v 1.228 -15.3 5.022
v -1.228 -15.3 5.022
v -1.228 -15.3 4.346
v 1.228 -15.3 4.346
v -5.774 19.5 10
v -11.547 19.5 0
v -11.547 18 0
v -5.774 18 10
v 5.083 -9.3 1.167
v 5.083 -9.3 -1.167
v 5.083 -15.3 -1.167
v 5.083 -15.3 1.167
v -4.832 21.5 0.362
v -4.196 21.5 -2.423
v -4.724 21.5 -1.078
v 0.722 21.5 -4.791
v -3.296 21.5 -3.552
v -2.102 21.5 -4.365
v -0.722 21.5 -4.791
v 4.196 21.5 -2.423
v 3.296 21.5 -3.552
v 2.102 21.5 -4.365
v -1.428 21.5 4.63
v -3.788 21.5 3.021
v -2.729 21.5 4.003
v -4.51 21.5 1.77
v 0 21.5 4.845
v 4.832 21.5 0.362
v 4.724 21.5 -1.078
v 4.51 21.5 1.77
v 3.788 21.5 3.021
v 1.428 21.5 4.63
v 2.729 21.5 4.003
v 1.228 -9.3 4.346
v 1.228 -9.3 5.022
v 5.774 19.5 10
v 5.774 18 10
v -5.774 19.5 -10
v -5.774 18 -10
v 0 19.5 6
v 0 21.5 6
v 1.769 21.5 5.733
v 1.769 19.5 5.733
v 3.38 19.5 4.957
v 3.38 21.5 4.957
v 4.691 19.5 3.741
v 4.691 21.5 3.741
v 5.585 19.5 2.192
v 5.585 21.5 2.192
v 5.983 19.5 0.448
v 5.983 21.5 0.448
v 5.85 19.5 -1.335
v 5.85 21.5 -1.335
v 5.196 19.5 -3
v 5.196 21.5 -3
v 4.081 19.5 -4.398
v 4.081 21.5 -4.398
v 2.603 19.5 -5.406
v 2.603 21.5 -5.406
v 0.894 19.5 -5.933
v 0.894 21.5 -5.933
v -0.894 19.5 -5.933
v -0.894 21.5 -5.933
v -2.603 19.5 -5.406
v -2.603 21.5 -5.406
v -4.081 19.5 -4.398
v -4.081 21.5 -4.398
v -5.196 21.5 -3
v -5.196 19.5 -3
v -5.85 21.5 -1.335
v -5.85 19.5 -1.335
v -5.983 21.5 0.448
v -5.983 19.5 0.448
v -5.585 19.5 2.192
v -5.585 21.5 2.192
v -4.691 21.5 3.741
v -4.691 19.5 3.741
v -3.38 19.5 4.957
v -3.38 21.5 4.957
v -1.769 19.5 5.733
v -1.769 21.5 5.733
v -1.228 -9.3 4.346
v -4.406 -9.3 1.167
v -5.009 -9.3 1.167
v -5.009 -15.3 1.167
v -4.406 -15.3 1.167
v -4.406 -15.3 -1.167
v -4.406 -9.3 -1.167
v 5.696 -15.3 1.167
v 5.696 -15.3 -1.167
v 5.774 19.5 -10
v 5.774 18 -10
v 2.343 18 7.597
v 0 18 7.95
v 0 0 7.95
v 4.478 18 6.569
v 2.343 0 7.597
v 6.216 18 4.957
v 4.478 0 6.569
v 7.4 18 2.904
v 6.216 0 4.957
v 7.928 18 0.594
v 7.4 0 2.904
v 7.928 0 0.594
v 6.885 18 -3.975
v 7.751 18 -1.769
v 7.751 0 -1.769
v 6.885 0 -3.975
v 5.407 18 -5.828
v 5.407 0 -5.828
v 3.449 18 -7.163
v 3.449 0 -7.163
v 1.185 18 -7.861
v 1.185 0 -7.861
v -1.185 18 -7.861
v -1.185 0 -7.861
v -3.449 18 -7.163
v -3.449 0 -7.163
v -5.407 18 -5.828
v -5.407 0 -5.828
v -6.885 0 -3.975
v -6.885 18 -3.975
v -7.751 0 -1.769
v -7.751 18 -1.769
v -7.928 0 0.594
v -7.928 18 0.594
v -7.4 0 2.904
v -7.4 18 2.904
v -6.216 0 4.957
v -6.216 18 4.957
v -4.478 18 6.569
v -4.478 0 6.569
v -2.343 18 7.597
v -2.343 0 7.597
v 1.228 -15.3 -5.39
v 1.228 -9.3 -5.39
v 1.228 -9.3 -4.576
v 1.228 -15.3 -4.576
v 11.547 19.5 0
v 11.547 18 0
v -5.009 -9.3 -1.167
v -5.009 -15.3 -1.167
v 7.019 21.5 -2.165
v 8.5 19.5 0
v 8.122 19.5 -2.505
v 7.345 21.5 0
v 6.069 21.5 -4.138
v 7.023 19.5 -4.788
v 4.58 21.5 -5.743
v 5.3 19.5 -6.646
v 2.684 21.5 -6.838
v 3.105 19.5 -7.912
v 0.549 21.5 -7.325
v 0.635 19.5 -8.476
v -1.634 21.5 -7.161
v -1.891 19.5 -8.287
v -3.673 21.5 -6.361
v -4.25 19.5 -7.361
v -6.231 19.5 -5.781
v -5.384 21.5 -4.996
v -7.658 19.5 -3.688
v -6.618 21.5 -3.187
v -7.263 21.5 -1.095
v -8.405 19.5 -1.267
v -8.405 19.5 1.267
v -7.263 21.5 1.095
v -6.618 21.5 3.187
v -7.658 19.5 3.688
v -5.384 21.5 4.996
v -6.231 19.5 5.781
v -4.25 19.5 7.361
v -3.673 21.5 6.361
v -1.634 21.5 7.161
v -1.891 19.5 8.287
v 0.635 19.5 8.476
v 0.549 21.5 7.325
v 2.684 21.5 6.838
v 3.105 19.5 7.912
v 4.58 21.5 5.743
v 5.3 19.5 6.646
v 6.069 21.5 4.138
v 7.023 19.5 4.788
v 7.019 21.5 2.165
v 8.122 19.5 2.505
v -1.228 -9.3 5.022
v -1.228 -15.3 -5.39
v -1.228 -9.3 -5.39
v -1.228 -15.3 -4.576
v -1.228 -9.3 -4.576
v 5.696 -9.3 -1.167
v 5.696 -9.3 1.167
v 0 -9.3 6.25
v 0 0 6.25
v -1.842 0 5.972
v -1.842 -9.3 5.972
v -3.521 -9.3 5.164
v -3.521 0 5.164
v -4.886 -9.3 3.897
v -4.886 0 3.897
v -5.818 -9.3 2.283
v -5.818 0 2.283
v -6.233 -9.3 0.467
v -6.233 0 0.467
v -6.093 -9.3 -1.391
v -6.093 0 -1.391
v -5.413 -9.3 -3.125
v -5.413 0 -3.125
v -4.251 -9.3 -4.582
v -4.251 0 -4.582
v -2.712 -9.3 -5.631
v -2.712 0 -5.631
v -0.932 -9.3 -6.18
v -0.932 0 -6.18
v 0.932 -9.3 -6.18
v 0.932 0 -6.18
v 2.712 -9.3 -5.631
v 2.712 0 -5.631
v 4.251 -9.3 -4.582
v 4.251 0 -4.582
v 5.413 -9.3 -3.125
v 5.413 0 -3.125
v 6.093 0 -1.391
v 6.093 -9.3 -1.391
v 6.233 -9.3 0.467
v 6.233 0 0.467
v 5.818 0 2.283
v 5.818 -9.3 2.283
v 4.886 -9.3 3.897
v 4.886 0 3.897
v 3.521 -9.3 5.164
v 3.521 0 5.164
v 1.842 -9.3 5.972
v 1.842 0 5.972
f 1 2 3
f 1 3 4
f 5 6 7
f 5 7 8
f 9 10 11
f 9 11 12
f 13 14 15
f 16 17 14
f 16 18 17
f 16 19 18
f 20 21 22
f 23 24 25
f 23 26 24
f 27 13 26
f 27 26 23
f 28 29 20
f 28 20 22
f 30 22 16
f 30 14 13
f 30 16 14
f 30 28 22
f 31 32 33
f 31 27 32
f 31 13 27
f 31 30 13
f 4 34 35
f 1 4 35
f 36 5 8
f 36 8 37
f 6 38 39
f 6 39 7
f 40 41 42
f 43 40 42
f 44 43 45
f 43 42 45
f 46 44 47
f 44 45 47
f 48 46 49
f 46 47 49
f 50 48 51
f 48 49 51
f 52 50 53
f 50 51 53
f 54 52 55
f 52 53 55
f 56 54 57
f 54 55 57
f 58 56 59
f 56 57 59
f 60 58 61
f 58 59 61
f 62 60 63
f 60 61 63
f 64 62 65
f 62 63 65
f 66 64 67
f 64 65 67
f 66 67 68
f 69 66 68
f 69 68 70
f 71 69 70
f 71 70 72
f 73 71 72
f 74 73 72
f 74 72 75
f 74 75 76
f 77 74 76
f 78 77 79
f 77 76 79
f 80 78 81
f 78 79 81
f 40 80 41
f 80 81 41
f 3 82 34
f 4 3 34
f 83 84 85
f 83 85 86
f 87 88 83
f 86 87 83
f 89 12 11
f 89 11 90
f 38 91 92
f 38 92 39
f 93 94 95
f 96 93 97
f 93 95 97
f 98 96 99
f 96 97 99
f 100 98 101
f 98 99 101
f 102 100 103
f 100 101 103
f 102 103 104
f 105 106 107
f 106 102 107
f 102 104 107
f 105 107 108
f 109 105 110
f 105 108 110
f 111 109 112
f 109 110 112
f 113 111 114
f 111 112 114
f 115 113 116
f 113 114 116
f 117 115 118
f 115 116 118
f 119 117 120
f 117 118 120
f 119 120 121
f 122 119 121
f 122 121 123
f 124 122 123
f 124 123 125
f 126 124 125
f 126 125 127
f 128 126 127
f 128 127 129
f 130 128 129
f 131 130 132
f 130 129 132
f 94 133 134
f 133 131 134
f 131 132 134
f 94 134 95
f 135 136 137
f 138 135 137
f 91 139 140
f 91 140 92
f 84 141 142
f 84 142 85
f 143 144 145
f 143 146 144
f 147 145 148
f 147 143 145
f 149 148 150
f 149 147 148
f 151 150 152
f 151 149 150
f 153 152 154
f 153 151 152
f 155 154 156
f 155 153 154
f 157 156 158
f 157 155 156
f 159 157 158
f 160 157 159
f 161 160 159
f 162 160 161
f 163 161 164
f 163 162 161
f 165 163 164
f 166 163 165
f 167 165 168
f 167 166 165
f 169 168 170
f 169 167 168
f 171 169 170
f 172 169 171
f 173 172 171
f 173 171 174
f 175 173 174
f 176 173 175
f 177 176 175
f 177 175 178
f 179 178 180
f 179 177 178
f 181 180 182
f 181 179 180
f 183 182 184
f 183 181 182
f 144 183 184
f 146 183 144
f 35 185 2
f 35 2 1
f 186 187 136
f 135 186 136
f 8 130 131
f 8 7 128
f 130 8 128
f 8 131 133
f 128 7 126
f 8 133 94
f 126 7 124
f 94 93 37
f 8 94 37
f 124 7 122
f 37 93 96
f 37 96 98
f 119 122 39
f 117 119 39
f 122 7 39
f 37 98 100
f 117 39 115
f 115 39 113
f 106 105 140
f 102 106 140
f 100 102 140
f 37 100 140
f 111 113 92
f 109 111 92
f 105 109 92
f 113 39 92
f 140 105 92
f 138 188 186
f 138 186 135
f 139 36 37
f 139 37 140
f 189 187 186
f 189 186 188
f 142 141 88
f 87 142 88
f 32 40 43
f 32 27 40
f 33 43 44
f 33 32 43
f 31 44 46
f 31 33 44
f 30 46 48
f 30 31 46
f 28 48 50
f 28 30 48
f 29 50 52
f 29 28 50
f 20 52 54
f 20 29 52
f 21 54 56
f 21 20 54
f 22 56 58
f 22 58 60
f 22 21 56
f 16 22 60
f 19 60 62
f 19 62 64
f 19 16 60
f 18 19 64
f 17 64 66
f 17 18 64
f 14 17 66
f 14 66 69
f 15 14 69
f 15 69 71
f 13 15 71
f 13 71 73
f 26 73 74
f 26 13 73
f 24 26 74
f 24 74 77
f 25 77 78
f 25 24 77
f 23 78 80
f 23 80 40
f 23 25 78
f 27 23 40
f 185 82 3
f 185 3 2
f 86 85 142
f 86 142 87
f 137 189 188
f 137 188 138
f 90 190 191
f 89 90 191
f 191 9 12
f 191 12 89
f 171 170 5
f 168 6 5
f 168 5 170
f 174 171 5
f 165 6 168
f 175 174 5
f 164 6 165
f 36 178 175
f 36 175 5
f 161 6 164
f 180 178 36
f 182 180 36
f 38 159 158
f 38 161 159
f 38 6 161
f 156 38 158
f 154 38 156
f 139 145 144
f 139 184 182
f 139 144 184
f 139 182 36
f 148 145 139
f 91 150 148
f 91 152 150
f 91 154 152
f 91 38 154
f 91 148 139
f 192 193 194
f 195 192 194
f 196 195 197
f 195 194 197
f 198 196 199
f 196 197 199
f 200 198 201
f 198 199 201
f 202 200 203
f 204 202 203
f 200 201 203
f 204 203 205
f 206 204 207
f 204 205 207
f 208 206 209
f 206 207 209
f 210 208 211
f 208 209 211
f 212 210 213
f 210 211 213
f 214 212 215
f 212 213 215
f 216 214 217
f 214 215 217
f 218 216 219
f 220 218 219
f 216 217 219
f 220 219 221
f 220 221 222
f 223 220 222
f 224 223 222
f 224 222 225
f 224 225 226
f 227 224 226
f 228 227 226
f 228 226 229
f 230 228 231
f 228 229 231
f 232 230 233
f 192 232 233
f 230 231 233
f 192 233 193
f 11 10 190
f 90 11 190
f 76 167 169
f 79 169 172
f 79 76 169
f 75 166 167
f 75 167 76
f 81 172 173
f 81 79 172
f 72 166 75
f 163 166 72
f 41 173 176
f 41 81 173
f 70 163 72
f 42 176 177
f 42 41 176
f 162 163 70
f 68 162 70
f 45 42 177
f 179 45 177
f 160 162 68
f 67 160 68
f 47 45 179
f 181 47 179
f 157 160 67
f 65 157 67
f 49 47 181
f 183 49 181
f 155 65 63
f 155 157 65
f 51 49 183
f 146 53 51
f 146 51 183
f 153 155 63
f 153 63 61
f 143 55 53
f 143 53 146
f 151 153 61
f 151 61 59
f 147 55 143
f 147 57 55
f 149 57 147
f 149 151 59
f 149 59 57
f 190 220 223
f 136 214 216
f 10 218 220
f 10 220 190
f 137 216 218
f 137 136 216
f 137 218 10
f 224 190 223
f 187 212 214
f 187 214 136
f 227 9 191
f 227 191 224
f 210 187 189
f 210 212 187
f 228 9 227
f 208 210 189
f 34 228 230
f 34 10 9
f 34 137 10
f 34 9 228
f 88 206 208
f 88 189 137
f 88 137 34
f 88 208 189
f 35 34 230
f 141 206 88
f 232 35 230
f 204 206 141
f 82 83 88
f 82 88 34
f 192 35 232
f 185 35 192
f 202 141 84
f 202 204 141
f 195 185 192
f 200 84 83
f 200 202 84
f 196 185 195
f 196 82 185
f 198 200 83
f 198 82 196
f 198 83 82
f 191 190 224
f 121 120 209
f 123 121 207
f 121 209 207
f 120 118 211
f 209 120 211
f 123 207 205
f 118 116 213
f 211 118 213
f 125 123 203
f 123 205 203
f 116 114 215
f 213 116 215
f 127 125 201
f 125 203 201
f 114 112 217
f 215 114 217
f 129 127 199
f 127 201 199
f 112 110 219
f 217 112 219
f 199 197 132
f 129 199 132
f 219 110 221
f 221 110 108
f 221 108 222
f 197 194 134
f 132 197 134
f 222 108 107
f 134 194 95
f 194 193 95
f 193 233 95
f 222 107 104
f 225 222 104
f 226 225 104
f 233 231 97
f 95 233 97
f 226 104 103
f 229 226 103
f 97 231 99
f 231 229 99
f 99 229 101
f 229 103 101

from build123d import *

# Parameters (mm, degrees)
SKETCH1_R           = 7.95
BOSS_EXTRUDE1_DEPTH = 19.5
BOSS_EXTRUDE2_DEPTH = 1.5
SKETCH3_R           = 8.5
BOSS_EXTRUDE3_DEPTH = 2
BOSS_EXTRUDE3_TAPER = 30
SKETCH4_R           = 6
CUT_EXTRUDE1_DEPTH  = 2
SKETCH6_R           = 6
BOSS_EXTRUDE4_DEPTH = 2
BOSS_EXTRUDE4_TAPER = 30
SKETCH7_R           = 6.25
BOSS_EXTRUDE5_DEPTH = 9.3
SKETCH8_W           = 2.45599171
SKETCH8_H           = 0.676111723
SKETCH8_W_2         = 0.61301599
SKETCH8_H_2         = 2.333871056
SKETCH8_H_3         = 0.814342288
SKETCH8_W_3         = 0.602821575
BOSS_EXTRUDE6_DEPTH = 6


with BuildPart() as part:
    # Sketch1 → Boss-Extrude1 (new body)
    with BuildSketch(Plane(origin=(0, 0, 0), x_dir=(1, 0, 0), z_dir=(0, 1, 0))):
        with Locations(Location((0, 0, 0), (0, 0, 270))):
            Circle(SKETCH1_R)
    extrude(amount=BOSS_EXTRUDE1_DEPTH)

    # Sketch2 → Boss-Extrude2 (add)
    with BuildSketch(Plane(origin=(0, 19.5, 0), x_dir=(1, 0, 0), z_dir=(0, 1, 0))):
        Polygon((11.547005384, 0), (5.773502692, 10), (-5.773502692, 10), (-11.547005384, 0), (-5.773502692, -10), (5.773502692, -10), align=None)
    extrude(amount=-BOSS_EXTRUDE2_DEPTH)

    # Sketch3 → Boss-Extrude3 (add)
    with BuildSketch(Plane(origin=(0, 19.5, 0), x_dir=(1, 0, 0), z_dir=(0, 1, 0))):
        Circle(SKETCH3_R)
    extrude(amount=BOSS_EXTRUDE3_DEPTH, taper=BOSS_EXTRUDE3_TAPER)

    # Sketch4 → Cut-Extrude1 (cut)
    with BuildSketch(Plane(origin=(0, 21.5, 0), x_dir=(1, 0, 0), z_dir=(0, 1, 0))):
        with Locations(Location((0, 0, 0), (0, 0, 270))):
            Circle(SKETCH4_R)
    extrude(amount=-CUT_EXTRUDE1_DEPTH, mode=Mode.SUBTRACT)

    # Sketch6 → Boss-Extrude4 (add)
    with BuildSketch(Plane(origin=(0, 19.5, 0), x_dir=(1, 0, 0), z_dir=(0, 1, 0))):
        with Locations(Location((0, 0, 0), (0, 0, 270))):
            Circle(SKETCH6_R)
    extrude(amount=BOSS_EXTRUDE4_DEPTH, taper=BOSS_EXTRUDE4_TAPER)

    # Sketch7 → Boss-Extrude5 (add)
    with BuildSketch(Plane.XZ):
        with Locations(Location((0, 0, 0), (0, 0, 90))):
            Circle(SKETCH7_R)
    extrude(amount=BOSS_EXTRUDE5_DEPTH)

    # Sketch8 → Boss-Extrude6 (add)
    with BuildSketch(Plane.XZ.offset(9.3)):
        with Locations((0, 4.683948284)):
            Rectangle(SKETCH8_W, SKETCH8_H)
        with Locations((5.389572467, 0)):
            Rectangle(SKETCH8_W_2, SKETCH8_H_2)
        with Locations((0, -4.982726266)):
            Rectangle(SKETCH8_W, SKETCH8_H_3)
        with Locations((-4.707688923, 0)):
            Rectangle(SKETCH8_W_3, SKETCH8_H_2)
    extrude(amount=BOSS_EXTRUDE6_DEPTH)


solid = part.part
